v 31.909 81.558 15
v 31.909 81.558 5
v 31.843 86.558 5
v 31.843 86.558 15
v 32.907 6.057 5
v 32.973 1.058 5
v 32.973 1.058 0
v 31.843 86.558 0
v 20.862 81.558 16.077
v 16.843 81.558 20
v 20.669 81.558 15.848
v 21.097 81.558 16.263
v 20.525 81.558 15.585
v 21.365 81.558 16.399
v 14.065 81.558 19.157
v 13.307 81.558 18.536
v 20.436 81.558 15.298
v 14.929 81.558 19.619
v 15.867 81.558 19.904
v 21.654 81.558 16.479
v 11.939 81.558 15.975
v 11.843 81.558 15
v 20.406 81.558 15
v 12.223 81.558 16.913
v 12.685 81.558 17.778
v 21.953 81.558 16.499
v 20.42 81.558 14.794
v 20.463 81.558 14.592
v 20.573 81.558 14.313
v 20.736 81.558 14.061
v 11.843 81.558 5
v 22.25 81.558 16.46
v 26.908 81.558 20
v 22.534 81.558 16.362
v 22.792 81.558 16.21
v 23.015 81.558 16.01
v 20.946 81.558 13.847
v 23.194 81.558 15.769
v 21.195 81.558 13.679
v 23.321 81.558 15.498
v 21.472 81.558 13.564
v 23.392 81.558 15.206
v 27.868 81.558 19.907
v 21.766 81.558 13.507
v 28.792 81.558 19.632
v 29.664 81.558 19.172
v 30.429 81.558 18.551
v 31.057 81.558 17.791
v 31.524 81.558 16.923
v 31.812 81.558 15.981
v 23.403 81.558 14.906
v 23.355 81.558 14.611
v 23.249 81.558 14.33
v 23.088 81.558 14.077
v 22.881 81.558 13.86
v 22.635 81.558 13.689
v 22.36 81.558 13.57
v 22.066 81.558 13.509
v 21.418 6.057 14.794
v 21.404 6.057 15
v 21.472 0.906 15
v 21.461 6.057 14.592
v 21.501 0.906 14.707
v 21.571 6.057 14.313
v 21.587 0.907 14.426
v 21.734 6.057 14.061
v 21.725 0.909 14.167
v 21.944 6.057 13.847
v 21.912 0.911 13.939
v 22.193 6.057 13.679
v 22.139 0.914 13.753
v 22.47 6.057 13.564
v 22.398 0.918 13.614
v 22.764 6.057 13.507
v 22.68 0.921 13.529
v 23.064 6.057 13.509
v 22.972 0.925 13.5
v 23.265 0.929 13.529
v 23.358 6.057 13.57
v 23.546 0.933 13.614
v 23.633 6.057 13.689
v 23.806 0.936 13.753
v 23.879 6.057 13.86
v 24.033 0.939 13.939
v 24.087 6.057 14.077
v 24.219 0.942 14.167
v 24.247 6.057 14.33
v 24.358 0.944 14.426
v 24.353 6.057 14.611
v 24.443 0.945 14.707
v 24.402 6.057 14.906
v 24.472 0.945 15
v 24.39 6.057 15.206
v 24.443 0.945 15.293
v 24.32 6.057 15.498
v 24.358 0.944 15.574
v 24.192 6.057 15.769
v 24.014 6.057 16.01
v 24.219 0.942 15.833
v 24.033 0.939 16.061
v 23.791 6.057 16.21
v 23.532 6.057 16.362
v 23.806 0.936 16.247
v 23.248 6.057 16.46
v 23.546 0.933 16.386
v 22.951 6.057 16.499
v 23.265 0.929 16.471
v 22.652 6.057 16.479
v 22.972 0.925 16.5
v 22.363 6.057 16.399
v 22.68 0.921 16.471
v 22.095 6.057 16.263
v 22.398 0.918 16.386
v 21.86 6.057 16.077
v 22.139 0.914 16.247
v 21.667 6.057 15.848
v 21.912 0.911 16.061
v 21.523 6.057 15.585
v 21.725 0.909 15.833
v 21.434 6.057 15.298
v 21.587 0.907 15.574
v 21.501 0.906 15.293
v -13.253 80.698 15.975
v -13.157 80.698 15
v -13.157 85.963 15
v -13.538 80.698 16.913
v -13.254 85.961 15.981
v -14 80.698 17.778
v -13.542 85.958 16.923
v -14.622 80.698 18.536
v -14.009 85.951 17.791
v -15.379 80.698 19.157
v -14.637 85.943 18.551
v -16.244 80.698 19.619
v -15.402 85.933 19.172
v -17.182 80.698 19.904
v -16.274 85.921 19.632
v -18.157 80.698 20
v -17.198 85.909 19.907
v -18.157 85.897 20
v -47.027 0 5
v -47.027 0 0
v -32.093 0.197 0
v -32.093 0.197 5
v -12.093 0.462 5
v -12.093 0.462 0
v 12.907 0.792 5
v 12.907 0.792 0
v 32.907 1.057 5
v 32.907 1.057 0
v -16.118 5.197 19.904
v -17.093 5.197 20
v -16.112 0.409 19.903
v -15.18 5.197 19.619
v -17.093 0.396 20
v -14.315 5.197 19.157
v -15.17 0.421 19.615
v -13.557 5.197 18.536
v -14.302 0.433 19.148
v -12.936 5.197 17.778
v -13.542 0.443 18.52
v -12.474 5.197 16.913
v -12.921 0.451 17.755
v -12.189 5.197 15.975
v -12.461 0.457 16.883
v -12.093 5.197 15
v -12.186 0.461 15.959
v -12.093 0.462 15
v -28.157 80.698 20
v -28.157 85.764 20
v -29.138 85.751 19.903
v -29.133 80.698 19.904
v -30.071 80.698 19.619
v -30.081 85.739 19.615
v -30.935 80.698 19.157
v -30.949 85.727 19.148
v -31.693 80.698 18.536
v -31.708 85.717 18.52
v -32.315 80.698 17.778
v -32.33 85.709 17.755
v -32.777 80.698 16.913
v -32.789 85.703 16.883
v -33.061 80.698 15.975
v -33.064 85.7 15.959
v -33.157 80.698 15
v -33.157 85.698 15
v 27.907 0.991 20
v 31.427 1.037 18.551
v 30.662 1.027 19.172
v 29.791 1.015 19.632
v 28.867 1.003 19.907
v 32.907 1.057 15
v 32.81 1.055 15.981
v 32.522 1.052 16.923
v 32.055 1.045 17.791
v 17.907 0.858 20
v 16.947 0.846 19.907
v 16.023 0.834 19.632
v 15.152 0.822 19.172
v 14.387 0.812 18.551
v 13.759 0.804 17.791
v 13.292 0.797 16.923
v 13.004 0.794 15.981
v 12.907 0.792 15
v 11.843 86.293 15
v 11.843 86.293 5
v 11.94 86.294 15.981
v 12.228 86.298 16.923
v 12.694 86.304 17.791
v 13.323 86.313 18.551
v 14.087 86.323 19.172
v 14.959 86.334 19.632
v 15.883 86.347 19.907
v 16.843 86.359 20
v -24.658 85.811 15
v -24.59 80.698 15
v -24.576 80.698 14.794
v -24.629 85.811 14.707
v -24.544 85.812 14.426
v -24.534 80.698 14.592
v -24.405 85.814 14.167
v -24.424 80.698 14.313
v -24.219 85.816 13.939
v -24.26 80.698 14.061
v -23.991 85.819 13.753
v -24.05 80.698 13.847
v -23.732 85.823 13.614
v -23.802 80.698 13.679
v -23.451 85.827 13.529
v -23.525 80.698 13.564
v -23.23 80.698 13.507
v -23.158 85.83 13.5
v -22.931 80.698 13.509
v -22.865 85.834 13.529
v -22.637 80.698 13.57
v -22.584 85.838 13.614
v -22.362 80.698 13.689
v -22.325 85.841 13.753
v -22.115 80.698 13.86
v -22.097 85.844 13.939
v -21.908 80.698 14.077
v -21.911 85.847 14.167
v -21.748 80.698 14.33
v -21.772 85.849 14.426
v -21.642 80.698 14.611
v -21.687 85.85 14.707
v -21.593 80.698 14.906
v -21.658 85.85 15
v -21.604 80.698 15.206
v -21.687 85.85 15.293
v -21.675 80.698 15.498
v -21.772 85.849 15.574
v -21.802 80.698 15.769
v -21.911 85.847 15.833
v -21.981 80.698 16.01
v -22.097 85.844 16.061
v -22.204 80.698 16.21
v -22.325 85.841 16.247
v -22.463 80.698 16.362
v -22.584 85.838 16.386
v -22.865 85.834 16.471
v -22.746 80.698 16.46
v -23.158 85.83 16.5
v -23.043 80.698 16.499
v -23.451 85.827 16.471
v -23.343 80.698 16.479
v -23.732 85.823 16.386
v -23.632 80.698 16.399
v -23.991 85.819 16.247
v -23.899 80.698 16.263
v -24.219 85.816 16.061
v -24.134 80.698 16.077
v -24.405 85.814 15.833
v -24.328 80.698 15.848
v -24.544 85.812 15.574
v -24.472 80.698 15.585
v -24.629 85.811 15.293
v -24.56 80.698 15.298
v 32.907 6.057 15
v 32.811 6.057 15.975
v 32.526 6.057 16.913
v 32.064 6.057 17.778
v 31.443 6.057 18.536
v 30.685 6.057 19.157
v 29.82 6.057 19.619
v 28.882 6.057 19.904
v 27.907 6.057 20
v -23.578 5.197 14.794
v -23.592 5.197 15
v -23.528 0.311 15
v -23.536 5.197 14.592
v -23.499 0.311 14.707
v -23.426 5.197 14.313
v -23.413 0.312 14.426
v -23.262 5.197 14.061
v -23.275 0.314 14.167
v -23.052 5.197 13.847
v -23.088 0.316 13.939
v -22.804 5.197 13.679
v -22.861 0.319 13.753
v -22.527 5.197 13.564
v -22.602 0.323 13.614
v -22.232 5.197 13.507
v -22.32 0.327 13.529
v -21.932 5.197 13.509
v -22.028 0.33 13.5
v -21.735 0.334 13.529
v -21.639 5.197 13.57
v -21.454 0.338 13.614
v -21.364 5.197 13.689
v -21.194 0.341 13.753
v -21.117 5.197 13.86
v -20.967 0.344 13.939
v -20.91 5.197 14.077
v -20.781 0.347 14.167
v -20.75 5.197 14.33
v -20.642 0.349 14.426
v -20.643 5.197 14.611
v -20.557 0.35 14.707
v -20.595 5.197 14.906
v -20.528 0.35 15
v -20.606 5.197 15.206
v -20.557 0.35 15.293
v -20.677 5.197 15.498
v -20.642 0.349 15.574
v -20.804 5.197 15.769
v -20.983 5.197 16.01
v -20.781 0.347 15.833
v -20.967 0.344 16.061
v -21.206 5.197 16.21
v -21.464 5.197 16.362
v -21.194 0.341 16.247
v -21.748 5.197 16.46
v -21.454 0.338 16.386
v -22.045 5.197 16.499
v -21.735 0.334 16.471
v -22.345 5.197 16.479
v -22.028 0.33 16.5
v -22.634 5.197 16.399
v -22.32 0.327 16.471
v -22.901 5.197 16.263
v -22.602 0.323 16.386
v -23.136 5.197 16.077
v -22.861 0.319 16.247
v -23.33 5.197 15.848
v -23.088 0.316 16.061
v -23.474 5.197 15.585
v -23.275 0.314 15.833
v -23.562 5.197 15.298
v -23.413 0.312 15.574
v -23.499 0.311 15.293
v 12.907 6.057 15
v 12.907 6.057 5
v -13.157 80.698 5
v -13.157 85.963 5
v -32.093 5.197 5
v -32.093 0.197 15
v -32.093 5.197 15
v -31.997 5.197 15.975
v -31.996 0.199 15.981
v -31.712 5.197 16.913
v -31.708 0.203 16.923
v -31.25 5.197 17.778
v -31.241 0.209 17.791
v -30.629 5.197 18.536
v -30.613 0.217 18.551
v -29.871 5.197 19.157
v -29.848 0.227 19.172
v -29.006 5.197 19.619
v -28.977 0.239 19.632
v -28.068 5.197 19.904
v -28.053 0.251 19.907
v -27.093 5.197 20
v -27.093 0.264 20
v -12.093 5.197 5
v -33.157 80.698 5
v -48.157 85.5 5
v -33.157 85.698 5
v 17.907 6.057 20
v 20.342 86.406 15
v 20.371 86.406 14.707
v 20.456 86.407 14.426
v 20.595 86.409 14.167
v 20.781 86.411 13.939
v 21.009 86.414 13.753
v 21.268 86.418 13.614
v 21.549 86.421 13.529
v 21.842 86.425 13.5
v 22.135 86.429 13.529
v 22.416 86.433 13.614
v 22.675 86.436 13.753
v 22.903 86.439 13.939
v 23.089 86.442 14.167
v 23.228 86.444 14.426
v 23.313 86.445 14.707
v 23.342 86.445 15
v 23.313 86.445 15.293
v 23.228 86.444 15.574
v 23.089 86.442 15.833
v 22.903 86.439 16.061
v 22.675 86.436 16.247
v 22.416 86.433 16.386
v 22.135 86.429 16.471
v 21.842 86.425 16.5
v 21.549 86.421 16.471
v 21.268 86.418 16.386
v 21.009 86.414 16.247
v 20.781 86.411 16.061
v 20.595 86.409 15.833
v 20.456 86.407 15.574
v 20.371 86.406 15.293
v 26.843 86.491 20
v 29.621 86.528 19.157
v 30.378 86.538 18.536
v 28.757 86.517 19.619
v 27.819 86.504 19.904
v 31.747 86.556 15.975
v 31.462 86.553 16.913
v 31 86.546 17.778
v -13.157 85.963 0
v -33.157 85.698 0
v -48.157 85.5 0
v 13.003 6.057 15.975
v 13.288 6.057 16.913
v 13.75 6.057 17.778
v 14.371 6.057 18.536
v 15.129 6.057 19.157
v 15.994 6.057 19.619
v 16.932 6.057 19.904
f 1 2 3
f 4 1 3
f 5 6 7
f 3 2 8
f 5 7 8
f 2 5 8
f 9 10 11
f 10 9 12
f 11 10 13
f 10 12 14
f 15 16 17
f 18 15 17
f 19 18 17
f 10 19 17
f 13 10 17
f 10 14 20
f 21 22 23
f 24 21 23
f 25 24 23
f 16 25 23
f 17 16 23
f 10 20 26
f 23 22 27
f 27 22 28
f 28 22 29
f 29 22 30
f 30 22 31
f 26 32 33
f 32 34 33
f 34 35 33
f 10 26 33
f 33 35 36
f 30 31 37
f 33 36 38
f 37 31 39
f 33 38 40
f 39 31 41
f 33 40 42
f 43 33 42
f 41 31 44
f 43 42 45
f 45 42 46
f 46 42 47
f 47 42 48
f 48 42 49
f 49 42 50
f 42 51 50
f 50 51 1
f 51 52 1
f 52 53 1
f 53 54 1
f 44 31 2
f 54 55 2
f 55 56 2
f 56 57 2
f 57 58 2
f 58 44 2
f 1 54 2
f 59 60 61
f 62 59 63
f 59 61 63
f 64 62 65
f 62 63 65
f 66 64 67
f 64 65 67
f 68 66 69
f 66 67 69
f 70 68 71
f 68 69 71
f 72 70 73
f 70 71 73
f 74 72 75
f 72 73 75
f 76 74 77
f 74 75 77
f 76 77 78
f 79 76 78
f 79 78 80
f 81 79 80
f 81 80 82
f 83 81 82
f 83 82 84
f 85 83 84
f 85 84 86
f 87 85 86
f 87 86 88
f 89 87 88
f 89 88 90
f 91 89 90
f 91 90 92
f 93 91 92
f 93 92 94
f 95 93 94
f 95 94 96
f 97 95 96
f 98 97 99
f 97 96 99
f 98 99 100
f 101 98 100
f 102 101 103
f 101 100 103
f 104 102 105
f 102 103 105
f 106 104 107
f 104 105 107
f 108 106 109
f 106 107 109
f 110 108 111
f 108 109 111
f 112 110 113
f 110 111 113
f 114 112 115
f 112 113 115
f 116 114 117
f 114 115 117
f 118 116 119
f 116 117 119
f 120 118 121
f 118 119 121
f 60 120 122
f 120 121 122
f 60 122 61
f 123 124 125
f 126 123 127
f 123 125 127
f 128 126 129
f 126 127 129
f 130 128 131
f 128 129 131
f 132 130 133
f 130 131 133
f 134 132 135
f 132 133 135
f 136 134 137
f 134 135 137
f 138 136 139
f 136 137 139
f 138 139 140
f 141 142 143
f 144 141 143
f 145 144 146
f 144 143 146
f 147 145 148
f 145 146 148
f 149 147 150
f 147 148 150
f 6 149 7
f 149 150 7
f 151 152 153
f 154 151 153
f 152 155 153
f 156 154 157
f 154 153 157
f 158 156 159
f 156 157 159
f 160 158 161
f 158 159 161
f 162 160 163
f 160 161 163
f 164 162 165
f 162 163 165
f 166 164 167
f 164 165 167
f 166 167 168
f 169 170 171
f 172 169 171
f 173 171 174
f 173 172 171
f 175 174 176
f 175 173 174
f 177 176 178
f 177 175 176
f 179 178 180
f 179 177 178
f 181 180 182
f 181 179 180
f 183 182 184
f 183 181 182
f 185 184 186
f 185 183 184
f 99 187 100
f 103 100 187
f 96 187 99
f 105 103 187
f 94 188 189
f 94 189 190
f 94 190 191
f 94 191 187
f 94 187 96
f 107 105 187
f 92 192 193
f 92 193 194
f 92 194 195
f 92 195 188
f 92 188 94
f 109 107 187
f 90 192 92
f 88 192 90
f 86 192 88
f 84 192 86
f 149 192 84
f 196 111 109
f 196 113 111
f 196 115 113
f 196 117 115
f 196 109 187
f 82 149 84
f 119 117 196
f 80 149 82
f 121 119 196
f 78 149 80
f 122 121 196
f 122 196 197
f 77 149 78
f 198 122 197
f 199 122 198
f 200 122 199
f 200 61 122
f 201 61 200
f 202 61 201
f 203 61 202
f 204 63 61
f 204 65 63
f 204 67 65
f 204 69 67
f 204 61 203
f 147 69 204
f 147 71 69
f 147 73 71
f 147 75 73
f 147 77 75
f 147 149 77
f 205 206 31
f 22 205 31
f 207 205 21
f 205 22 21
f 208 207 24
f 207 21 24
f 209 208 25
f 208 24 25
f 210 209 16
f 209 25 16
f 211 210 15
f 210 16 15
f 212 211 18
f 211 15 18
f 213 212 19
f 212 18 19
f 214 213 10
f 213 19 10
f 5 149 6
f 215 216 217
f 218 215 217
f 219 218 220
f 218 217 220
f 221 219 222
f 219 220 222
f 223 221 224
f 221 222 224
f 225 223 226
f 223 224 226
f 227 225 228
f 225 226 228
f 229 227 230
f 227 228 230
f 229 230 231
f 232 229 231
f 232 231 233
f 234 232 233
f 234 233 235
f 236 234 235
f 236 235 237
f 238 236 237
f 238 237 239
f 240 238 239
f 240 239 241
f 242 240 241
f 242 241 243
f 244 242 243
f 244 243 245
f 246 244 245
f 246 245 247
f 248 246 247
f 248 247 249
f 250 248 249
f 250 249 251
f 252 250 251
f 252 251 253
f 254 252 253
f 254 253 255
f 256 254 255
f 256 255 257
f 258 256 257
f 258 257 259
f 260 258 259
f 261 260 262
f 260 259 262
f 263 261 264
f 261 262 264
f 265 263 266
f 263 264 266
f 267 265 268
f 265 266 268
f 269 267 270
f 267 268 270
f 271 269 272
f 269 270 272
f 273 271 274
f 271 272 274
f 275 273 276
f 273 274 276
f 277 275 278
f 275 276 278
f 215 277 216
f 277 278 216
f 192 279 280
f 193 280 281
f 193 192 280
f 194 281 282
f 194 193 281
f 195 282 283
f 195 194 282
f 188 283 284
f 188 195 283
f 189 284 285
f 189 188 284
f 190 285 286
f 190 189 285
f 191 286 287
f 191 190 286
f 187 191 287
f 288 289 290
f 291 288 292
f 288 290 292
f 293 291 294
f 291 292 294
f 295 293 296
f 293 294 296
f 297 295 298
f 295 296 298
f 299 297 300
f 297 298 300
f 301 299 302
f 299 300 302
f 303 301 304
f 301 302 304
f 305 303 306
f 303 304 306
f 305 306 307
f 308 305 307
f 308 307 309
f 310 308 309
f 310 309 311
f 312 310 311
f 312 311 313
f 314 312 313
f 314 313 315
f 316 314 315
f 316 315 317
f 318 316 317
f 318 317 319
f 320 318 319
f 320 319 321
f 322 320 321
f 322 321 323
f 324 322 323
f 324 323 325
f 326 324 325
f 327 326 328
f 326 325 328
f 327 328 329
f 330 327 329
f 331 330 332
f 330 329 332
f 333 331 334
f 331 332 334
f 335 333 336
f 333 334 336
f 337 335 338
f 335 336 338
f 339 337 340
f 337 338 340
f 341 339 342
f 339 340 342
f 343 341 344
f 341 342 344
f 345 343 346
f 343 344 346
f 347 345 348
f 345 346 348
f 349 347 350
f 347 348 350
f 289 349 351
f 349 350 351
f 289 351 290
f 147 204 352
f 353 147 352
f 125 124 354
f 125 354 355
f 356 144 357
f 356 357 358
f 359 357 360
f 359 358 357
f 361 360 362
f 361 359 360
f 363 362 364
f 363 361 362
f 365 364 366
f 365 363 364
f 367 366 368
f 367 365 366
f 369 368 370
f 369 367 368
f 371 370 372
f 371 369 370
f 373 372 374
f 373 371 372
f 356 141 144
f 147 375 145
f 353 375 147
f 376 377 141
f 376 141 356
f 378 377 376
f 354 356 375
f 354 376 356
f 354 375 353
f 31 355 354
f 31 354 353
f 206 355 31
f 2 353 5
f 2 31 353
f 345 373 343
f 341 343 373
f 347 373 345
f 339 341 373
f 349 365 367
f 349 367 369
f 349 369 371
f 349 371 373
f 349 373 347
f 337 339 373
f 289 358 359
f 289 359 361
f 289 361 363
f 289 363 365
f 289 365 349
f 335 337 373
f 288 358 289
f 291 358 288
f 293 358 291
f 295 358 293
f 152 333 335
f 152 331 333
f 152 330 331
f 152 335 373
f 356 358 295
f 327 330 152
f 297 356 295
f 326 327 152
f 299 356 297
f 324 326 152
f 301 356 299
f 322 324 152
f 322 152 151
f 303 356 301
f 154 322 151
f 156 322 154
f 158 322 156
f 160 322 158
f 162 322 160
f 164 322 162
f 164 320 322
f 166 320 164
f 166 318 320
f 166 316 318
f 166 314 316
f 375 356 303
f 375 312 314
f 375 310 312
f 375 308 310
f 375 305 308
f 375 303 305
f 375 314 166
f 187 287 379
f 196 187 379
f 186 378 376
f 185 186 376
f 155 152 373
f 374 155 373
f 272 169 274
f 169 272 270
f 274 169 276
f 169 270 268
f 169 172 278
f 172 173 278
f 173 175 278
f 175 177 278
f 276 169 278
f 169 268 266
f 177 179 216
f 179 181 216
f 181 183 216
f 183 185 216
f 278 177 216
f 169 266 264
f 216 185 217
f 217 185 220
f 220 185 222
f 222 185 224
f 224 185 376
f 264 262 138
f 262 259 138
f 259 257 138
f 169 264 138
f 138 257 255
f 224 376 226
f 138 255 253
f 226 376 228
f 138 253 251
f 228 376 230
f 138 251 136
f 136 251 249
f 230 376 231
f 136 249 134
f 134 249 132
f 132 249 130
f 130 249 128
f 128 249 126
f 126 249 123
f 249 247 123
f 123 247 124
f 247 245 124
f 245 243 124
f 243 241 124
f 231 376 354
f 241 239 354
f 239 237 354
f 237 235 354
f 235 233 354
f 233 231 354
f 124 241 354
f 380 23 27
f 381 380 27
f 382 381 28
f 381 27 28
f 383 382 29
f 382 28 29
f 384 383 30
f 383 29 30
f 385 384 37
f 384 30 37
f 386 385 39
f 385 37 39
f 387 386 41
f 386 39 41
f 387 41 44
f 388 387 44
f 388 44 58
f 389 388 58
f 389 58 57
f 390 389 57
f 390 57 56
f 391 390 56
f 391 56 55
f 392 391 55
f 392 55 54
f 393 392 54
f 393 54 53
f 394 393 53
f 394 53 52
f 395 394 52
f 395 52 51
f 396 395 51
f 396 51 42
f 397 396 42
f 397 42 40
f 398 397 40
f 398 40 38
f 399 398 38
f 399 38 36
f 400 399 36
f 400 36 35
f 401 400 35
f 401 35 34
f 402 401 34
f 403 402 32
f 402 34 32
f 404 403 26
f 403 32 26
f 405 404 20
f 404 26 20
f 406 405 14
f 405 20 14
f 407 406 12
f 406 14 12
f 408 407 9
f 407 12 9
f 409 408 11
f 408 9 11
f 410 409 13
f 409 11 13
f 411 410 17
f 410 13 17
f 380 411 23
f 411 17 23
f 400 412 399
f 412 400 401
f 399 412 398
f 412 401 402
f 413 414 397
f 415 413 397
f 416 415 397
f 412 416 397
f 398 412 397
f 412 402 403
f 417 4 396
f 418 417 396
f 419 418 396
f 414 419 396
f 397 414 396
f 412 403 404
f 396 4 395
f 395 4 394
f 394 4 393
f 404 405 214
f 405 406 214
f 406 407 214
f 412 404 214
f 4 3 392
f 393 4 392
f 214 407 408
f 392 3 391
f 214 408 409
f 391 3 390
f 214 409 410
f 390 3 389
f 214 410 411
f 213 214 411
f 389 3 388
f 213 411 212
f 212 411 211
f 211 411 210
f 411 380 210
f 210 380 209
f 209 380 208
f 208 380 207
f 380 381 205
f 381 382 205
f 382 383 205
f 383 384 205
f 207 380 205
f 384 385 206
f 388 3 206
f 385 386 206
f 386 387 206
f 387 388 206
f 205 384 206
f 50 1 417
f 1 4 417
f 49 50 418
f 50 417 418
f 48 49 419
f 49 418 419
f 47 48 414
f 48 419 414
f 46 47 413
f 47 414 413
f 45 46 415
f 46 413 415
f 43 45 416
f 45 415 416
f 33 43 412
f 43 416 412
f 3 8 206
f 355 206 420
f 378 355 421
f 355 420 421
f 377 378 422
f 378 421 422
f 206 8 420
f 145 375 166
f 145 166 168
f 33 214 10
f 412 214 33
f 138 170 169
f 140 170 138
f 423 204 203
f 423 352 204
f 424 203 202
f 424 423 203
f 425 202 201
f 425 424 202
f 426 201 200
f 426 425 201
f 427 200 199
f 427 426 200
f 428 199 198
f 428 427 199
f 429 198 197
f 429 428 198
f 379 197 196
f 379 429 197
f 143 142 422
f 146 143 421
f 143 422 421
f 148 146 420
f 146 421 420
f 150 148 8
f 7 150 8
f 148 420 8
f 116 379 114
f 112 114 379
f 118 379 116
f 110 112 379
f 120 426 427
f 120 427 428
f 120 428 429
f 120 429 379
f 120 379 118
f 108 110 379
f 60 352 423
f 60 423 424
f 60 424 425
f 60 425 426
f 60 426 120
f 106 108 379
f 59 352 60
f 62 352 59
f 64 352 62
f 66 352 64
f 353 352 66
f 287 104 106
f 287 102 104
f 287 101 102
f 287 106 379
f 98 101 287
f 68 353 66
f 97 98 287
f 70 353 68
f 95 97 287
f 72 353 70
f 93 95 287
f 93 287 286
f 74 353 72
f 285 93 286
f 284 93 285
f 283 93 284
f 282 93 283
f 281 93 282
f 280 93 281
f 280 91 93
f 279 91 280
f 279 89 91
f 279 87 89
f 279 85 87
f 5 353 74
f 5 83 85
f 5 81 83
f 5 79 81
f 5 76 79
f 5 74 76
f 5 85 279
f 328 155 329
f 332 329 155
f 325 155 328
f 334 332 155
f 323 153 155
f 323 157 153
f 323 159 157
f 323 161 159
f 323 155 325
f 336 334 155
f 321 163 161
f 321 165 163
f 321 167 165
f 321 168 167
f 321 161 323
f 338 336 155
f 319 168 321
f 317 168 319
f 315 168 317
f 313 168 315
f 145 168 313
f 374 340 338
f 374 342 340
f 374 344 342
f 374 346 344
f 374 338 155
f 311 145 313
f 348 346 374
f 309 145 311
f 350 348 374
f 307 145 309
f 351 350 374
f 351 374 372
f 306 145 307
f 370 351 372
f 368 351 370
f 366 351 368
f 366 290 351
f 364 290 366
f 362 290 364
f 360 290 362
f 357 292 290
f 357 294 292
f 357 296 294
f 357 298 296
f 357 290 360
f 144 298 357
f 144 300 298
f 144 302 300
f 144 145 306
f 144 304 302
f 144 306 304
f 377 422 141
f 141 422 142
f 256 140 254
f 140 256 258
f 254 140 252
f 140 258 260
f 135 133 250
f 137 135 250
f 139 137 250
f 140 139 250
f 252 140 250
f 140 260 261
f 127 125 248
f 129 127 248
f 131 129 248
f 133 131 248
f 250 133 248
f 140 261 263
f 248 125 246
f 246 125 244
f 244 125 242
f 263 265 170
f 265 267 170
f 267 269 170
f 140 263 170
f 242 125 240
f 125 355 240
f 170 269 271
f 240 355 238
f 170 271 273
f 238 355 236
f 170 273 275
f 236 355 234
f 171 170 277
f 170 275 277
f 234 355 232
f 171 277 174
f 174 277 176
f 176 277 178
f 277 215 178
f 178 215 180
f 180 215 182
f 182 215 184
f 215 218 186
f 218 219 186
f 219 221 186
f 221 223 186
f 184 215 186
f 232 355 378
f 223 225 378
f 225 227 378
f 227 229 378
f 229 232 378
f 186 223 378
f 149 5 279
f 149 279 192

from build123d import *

# Parameters (mm, degrees)
BOSS_EXTRUDE1_DEPTH      = 5
BOSS_EXTRUDE2_DEPTH      = 20
FILLET1_R                = 5
F_3_0_3_DIAMETER_HOLE1_D = 3


with BuildPart() as part:
    # Sketch1 → Boss-Extrude1 (new body)
    with BuildSketch(Plane.XY):
        Polygon((-47.026906911, 0), (32.973093089, 1.057571587), (31.842813456, 86.557571587), (-48.157186544, 85.5), align=None)
    extrude(amount=BOSS_EXTRUDE1_DEPTH)

    # Sketch2 → Boss-Extrude2 (add)
    with BuildSketch(Plane.XY):
        Polygon((-33.157186544, 85.698294672), (-33.157186544, 80.698294672), (-13.157186544, 80.698294672), (-13.157186544, 85.962687569), align=None)
        Polygon((11.842813456, 86.29317869), (11.842813456, 81.558008427), (31.908905905, 81.558008427), (31.842813456, 86.557571587), align=None)
        Polygon((-32.092993586, 0.19742103), (-32.092993586, 5.19742103), (-12.092993586, 5.19742103), (-12.092993586, 0.461813927), align=None)
        Polygon((12.907006414, 0.792305048), (12.907006414, 6.056697944), (32.907006414, 6.056697944), (32.907006414, 1.056697944), align=None)
    extrude(amount=BOSS_EXTRUDE2_DEPTH)

    # Fillet1
    fillet1_edges = [part.edges().sort_by_distance(p)[0] for p in [
        (-33.157186544, 83.198294672, 20),
        (-13.157186544, 83.330491121, 20),
        (31.87585968, 84.057790007, 20),
        (11.842813456, 83.925593558, 20),
        (-12.092993586, 2.829617478, 20),
        (-32.092993586, 2.69742103, 20),
        (32.907006414, 3.556697944, 20),
        (12.907006414, 3.424501496, 20),
    ]]
    fillet(fillet1_edges, radius=FILLET1_R)

    # Ø3.0 (3) Diameter Hole1 (through all)
    with Locations(Plane(origin=(-1.138496573, 86.121570382, 0), x_dir=(0.9999126319463549, 0.013218489857519894, 0), z_dir=(-0.013218489857519894, 0.9999126319463549, 0))):
        with Locations((-22.021487627, -15), (22.982444279, -15)):
            Hole(F_3_0_3_DIAMETER_HOLE1_D / 2)


solid = part.part
